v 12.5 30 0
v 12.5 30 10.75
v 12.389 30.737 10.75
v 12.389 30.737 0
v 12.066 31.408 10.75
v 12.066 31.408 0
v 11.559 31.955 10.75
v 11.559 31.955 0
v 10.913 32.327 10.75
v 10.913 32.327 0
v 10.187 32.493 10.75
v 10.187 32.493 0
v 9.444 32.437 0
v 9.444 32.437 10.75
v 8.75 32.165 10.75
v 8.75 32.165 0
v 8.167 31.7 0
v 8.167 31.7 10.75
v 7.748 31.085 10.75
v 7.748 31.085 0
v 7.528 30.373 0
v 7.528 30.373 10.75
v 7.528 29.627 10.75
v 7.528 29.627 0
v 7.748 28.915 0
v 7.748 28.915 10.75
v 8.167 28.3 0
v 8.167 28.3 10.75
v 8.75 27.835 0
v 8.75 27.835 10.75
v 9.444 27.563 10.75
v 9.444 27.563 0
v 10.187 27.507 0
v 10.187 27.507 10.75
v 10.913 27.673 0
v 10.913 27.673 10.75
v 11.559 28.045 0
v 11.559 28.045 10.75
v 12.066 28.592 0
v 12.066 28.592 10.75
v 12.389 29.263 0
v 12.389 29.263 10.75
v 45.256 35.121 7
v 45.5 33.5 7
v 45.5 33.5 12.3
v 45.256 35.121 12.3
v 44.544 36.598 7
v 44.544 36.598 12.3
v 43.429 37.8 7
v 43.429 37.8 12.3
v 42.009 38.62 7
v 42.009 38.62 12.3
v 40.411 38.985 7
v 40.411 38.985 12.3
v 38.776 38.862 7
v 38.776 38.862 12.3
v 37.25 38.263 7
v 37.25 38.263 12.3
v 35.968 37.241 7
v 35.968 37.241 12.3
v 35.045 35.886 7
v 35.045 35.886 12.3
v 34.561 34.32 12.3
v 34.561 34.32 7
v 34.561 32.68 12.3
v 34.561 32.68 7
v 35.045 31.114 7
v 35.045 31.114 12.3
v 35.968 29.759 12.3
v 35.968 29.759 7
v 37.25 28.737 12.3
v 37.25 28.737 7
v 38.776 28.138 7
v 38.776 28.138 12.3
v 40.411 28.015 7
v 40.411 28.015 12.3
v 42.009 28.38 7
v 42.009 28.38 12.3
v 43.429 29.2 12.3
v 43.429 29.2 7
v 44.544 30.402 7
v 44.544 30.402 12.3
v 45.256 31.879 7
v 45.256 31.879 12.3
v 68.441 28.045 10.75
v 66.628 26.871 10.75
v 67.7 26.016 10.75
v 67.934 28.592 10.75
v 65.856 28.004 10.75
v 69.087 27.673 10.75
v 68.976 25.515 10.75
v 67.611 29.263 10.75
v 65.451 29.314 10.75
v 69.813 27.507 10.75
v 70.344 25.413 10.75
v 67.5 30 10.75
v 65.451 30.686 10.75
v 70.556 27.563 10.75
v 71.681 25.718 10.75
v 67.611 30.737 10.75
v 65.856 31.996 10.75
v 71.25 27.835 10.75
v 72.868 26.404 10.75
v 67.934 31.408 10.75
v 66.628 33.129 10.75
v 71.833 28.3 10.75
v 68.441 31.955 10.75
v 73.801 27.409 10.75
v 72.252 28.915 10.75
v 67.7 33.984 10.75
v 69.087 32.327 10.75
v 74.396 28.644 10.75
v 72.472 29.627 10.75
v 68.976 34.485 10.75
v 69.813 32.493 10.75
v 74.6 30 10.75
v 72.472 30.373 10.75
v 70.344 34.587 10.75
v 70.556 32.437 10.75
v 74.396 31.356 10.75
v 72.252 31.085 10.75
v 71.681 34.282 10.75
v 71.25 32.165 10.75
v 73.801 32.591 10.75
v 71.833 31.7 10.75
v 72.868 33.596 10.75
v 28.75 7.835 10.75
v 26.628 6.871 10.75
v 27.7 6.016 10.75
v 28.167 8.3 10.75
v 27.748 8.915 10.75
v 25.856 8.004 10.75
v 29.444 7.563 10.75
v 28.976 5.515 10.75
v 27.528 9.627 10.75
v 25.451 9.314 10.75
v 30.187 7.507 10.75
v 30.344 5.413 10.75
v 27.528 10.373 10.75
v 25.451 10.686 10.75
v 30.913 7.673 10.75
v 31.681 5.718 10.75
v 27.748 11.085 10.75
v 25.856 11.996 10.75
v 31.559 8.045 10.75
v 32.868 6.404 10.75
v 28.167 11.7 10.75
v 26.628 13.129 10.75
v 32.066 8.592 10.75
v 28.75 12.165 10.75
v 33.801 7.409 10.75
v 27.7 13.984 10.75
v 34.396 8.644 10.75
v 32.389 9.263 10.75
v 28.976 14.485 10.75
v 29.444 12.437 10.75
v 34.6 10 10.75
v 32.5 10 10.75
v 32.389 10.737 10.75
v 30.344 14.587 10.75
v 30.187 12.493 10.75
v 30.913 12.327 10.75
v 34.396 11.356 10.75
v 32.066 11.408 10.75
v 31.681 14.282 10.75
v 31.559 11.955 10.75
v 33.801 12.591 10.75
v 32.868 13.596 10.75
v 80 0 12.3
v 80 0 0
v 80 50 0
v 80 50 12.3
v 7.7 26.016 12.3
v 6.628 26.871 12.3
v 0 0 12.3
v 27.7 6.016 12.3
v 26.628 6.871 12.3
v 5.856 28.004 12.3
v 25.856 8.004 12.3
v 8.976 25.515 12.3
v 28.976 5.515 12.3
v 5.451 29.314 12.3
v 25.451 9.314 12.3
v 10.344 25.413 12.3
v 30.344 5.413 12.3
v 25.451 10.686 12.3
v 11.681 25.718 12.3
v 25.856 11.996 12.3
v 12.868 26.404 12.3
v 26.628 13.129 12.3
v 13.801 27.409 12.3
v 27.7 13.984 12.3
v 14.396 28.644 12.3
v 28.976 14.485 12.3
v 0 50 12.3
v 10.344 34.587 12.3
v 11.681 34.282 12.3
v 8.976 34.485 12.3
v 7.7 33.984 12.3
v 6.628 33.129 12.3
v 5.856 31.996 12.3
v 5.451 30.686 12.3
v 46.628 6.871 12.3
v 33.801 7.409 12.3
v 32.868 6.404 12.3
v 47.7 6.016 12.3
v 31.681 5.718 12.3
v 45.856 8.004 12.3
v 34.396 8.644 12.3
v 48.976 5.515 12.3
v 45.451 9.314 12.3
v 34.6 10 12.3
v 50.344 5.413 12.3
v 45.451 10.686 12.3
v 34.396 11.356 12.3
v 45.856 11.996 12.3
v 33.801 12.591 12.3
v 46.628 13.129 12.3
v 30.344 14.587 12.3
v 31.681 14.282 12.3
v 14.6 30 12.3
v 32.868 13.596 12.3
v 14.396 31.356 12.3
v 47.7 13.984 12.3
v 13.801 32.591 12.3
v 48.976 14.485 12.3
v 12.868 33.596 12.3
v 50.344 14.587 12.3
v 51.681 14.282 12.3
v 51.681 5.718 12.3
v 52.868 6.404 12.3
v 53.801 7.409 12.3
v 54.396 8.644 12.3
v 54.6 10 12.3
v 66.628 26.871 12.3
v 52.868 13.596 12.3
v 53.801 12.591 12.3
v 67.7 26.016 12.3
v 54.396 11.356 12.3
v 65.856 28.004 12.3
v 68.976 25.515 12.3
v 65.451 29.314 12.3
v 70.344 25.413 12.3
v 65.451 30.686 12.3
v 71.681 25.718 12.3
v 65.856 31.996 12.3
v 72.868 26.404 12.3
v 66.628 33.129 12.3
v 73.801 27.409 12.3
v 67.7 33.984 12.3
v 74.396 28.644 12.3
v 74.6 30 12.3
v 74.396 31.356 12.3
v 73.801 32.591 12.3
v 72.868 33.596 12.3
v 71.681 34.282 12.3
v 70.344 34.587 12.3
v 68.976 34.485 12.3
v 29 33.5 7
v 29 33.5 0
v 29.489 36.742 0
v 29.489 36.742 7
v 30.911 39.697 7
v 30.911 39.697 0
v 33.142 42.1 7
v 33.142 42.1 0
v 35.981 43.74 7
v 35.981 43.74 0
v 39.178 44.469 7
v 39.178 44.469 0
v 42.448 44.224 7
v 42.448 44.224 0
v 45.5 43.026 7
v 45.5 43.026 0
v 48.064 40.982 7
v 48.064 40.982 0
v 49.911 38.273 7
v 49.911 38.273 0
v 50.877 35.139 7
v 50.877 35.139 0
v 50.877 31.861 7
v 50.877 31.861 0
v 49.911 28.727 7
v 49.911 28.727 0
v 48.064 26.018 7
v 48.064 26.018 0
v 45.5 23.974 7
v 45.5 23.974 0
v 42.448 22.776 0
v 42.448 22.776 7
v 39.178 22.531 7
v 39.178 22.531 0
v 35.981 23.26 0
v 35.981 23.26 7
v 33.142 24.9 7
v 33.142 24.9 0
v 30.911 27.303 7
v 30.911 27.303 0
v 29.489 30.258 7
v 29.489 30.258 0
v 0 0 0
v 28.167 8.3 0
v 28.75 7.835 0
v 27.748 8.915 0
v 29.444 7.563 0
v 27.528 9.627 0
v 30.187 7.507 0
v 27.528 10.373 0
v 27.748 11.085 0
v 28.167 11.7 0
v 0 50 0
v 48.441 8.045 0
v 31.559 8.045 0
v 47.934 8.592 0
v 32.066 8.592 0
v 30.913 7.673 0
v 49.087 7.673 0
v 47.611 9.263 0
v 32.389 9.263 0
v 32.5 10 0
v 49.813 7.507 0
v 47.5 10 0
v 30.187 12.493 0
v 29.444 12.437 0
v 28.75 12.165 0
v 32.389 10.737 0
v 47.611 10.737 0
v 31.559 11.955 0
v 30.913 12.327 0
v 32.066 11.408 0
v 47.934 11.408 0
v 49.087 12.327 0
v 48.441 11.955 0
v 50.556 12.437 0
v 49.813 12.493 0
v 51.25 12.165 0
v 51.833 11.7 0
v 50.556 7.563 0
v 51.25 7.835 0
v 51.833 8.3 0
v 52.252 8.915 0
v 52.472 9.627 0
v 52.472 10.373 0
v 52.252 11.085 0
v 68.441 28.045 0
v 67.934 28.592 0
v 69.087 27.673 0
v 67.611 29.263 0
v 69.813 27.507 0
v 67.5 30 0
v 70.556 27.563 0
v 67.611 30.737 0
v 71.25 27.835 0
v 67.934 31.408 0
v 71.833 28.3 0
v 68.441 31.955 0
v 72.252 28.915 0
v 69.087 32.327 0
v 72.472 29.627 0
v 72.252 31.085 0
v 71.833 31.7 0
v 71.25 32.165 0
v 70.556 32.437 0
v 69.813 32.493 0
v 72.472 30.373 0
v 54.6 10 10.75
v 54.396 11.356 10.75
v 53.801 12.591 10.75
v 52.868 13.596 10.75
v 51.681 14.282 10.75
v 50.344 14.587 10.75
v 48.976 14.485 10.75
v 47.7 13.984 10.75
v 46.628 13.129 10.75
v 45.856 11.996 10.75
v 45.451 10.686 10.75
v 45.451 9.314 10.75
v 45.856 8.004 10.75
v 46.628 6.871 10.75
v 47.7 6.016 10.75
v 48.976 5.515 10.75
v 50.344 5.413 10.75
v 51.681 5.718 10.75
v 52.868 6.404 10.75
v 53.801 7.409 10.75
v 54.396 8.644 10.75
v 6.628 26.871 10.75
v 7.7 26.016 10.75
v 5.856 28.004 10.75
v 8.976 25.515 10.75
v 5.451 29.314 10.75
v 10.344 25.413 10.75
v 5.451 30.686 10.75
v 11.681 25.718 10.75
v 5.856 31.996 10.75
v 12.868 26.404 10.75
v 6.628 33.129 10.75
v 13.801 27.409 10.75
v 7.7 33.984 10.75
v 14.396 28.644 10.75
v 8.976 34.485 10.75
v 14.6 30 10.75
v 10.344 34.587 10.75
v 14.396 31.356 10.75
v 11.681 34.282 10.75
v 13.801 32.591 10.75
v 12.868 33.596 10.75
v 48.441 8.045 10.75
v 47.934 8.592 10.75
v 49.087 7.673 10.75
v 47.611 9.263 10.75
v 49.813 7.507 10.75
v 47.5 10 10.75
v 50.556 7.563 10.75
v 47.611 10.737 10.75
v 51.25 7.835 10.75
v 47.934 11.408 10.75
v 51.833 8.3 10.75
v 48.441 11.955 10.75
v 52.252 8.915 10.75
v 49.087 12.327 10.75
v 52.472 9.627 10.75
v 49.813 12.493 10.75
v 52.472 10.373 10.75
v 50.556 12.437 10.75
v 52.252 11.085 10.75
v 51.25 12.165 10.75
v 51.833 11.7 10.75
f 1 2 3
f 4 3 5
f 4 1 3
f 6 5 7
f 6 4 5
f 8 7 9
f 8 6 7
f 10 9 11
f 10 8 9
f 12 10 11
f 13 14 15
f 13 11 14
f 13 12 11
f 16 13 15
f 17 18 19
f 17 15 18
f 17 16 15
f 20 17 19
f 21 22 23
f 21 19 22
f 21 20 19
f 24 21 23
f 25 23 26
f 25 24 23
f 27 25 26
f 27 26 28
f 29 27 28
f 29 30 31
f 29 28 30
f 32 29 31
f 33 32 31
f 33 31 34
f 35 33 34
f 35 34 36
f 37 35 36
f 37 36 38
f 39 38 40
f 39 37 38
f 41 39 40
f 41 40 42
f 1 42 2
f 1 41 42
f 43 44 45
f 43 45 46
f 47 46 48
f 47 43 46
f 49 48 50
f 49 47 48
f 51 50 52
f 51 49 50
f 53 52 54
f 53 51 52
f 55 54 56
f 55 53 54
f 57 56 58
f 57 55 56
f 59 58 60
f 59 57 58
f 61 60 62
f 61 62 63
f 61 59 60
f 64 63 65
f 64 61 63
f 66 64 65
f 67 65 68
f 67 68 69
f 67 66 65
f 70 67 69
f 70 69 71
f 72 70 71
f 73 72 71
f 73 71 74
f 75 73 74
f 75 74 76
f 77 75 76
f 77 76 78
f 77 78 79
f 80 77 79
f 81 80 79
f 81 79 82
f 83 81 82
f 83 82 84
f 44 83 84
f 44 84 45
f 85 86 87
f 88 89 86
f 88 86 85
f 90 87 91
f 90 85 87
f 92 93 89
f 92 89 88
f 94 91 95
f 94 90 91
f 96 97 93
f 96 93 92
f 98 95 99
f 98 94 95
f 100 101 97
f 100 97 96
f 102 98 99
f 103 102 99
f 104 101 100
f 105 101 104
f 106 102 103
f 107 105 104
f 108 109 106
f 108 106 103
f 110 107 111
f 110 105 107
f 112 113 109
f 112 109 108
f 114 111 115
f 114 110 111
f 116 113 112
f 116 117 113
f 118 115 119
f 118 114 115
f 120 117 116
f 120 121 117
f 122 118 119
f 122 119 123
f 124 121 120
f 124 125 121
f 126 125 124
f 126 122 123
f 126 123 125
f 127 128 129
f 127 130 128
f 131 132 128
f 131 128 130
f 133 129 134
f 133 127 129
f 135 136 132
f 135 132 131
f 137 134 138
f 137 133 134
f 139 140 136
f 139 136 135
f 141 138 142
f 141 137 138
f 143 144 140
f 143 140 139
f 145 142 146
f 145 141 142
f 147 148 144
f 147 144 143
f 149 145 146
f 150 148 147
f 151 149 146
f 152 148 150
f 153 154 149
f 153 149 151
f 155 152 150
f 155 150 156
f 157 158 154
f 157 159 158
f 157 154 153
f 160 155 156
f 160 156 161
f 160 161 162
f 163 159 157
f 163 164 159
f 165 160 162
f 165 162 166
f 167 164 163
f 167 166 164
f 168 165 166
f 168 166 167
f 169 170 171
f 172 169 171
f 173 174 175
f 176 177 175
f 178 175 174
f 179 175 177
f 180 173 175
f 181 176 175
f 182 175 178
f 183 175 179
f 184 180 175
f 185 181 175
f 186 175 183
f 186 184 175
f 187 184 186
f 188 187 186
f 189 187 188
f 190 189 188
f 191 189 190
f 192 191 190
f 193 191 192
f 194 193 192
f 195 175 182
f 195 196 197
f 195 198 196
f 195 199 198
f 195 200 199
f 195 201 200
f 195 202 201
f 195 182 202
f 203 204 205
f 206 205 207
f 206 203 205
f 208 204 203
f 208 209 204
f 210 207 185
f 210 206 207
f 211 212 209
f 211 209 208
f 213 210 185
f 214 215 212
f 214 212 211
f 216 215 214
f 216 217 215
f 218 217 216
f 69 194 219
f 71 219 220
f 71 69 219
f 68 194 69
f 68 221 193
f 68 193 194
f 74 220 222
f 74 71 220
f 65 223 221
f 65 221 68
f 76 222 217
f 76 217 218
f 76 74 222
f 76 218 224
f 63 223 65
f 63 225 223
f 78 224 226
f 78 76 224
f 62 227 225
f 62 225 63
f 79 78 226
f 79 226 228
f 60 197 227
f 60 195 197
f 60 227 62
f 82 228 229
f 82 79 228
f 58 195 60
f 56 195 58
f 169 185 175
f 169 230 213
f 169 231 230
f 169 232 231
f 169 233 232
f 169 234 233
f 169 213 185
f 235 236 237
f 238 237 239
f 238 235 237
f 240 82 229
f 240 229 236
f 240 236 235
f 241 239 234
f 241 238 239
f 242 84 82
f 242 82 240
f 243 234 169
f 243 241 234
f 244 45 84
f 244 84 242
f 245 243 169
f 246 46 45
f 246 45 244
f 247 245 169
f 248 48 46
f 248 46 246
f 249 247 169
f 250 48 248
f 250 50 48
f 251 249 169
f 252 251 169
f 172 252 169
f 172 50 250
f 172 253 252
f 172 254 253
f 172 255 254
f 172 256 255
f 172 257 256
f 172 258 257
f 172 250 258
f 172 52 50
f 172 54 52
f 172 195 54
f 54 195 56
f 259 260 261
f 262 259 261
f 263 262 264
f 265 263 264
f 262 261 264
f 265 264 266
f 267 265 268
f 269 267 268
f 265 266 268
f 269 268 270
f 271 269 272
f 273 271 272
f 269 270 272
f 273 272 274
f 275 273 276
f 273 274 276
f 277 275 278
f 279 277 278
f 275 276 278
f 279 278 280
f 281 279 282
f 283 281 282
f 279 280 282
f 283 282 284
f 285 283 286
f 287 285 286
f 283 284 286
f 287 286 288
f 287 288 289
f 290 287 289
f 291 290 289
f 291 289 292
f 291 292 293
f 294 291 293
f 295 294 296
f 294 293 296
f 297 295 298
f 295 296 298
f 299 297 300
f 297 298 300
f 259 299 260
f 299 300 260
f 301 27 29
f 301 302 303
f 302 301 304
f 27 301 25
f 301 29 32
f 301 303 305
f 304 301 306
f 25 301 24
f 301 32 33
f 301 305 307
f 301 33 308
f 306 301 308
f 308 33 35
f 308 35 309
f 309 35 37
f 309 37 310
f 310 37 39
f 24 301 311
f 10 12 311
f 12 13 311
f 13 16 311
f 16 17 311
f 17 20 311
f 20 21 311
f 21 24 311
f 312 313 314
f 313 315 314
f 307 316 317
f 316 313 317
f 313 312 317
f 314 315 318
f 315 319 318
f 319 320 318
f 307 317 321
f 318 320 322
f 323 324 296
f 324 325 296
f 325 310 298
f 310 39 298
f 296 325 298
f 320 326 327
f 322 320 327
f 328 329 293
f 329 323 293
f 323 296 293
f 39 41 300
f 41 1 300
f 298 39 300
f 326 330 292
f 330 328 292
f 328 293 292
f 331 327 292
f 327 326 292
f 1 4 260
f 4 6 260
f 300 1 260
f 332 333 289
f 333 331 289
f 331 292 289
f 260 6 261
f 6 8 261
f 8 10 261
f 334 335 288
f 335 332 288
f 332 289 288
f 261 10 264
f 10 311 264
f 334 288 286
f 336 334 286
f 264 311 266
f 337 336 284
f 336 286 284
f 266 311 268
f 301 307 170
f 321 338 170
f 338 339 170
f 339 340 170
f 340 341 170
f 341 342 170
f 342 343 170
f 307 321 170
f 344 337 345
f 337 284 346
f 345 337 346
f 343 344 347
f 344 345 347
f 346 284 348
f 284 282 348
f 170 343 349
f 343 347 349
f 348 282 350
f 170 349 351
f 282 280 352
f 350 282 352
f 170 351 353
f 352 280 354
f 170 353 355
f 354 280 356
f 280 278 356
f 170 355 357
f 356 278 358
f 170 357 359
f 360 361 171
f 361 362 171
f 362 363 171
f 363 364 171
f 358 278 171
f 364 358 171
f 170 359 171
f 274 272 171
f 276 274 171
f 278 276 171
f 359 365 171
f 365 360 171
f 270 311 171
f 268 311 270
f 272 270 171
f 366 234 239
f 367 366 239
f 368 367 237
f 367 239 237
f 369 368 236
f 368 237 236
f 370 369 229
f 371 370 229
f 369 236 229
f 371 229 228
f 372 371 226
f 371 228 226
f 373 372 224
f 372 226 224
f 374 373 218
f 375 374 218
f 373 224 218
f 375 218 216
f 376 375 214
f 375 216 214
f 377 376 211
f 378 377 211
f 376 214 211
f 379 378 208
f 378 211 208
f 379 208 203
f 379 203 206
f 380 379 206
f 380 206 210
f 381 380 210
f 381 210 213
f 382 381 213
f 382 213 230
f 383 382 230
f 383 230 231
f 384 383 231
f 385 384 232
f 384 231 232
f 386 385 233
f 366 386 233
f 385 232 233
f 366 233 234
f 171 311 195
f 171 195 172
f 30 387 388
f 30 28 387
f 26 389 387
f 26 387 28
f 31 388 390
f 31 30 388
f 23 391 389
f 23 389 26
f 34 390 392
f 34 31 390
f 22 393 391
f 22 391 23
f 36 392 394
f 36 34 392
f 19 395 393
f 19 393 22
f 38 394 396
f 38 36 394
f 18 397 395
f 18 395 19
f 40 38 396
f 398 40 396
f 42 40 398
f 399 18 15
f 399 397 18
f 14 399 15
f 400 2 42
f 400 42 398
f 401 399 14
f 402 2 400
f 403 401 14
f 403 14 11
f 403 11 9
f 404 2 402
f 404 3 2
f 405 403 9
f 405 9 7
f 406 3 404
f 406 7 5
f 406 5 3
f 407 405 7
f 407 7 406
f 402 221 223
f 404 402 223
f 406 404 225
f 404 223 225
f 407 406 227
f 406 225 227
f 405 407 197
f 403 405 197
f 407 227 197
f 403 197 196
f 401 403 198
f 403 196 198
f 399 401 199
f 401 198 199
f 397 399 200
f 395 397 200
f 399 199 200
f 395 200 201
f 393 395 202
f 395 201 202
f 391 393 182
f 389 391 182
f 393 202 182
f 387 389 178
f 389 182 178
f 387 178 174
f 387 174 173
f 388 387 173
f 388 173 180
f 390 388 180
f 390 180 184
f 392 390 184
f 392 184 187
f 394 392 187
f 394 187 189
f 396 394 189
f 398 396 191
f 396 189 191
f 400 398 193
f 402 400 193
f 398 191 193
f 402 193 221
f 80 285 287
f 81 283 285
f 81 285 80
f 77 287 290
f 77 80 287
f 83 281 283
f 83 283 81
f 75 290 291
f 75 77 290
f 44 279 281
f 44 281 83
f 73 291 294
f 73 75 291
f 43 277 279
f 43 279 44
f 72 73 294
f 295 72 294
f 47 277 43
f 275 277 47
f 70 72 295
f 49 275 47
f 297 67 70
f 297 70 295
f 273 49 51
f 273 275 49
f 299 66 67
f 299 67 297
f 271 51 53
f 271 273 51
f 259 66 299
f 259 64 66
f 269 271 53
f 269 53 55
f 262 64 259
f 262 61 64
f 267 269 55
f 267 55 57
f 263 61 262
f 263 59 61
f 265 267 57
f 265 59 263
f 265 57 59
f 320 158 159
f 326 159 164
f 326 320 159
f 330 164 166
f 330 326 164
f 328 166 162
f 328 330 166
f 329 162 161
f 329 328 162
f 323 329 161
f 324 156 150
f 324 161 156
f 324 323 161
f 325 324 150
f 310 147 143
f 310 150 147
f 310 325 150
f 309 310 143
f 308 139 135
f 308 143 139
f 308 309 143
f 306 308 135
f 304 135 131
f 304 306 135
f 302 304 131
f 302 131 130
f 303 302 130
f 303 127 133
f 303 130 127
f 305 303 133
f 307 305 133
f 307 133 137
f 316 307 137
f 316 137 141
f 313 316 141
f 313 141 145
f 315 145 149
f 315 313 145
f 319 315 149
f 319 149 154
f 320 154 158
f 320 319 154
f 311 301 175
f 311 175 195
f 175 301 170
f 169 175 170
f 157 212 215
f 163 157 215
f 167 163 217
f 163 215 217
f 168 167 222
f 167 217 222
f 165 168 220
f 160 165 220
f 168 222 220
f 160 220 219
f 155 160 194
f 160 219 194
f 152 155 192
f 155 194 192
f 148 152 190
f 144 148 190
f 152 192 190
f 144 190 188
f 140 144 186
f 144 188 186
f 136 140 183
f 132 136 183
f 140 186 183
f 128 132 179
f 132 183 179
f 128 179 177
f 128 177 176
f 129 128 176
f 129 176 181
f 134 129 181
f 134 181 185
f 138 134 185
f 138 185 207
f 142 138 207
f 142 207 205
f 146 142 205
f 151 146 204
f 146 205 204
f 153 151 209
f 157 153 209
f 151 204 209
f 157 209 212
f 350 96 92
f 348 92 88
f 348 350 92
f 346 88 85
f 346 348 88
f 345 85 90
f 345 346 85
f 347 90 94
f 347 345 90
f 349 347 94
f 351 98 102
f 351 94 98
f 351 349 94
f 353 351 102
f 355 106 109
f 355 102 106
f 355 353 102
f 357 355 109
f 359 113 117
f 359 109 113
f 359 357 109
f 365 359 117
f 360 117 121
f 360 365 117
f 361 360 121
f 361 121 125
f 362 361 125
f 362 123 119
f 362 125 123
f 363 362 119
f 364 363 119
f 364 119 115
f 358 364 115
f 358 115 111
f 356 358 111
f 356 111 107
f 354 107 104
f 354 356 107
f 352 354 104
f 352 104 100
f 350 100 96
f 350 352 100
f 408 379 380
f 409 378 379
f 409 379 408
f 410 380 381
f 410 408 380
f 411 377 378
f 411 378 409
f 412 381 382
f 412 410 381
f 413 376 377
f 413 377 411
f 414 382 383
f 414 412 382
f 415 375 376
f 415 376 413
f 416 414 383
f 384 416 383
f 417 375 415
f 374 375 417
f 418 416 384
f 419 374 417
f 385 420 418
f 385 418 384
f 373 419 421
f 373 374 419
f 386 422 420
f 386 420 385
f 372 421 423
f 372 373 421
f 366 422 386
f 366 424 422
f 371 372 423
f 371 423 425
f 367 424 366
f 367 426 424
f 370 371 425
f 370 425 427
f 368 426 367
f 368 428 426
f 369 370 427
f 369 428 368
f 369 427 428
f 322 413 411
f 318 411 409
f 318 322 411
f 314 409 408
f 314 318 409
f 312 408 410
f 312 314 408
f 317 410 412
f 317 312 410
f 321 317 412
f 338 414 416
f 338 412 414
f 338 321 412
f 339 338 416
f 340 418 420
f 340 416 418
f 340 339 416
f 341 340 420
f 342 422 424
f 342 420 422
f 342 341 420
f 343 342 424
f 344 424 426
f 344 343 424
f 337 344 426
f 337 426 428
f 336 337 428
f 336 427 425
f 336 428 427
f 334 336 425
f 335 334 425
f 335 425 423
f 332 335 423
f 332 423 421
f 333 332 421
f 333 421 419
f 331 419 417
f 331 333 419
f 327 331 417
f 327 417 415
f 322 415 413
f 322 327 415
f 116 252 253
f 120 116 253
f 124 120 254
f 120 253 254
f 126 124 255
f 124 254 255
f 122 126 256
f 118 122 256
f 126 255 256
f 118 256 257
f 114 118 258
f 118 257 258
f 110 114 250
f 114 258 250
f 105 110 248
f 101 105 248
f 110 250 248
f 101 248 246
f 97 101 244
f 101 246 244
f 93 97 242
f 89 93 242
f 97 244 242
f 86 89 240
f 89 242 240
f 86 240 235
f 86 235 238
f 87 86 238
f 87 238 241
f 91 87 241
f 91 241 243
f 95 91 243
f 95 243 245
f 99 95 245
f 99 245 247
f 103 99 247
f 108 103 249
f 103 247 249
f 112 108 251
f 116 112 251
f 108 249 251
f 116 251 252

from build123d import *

# Parameters (mm, degrees)
SKETCH1_W           = 80
SKETCH1_H           = 50
SKETCH1_R           = 5.5
SKETCH1_R_2         = 2.5
BOSS_EXTRUDE1_DEPTH = 12.3
SKETCH2_R           = 4.6
CUT_EXTRUDE1_DEPTH  = 1.55
SKETCH3_R           = 11
CUT_EXTRUDE2_DEPTH  = 7


with BuildPart() as part:
    # Sketch1 → Boss-Extrude1 (new body)
    with BuildSketch(Plane.XY):
        with Locations((40, 25)):
            Rectangle(SKETCH1_W, SKETCH1_H)
        with Locations((40, 33.5)):
            Circle(SKETCH1_R, mode=Mode.SUBTRACT)
        with Locations((10, 30)):
            Circle(SKETCH1_R_2, mode=Mode.SUBTRACT)
        with Locations(Location((70, 30, 0), (0, 0, 180))):
            Circle(SKETCH1_R_2, mode=Mode.SUBTRACT)
        with Locations((30, 10)):
            Circle(SKETCH1_R_2, mode=Mode.SUBTRACT)
        with Locations(Location((50, 10, 0), (0, 0, 180))):
            Circle(SKETCH1_R_2, mode=Mode.SUBTRACT)
    extrude(amount=BOSS_EXTRUDE1_DEPTH)

    # Sketch2 → Cut-Extrude1 (cut)
    with BuildSketch(Plane.XY.offset(12.3)):
        with Locations((10, 30)):
            Circle(SKETCH2_R)
        with Locations((70, 30)):
            Circle(SKETCH2_R)
        with Locations((30, 10)):
            Circle(SKETCH2_R)
        with Locations((50, 10)):
            Circle(SKETCH2_R)
    extrude(amount=-CUT_EXTRUDE1_DEPTH, mode=Mode.SUBTRACT)

    # Sketch3 → Cut-Extrude2 (cut)
    with BuildSketch(Plane(origin=(0, 0, 0), x_dir=(-1, 0, 0), z_dir=(0, 0, -1))):
        with Locations((-40, 33.5)):
            Circle(SKETCH3_R)
    extrude(amount=-CUT_EXTRUDE2_DEPTH, mode=Mode.SUBTRACT)


solid = part.part
